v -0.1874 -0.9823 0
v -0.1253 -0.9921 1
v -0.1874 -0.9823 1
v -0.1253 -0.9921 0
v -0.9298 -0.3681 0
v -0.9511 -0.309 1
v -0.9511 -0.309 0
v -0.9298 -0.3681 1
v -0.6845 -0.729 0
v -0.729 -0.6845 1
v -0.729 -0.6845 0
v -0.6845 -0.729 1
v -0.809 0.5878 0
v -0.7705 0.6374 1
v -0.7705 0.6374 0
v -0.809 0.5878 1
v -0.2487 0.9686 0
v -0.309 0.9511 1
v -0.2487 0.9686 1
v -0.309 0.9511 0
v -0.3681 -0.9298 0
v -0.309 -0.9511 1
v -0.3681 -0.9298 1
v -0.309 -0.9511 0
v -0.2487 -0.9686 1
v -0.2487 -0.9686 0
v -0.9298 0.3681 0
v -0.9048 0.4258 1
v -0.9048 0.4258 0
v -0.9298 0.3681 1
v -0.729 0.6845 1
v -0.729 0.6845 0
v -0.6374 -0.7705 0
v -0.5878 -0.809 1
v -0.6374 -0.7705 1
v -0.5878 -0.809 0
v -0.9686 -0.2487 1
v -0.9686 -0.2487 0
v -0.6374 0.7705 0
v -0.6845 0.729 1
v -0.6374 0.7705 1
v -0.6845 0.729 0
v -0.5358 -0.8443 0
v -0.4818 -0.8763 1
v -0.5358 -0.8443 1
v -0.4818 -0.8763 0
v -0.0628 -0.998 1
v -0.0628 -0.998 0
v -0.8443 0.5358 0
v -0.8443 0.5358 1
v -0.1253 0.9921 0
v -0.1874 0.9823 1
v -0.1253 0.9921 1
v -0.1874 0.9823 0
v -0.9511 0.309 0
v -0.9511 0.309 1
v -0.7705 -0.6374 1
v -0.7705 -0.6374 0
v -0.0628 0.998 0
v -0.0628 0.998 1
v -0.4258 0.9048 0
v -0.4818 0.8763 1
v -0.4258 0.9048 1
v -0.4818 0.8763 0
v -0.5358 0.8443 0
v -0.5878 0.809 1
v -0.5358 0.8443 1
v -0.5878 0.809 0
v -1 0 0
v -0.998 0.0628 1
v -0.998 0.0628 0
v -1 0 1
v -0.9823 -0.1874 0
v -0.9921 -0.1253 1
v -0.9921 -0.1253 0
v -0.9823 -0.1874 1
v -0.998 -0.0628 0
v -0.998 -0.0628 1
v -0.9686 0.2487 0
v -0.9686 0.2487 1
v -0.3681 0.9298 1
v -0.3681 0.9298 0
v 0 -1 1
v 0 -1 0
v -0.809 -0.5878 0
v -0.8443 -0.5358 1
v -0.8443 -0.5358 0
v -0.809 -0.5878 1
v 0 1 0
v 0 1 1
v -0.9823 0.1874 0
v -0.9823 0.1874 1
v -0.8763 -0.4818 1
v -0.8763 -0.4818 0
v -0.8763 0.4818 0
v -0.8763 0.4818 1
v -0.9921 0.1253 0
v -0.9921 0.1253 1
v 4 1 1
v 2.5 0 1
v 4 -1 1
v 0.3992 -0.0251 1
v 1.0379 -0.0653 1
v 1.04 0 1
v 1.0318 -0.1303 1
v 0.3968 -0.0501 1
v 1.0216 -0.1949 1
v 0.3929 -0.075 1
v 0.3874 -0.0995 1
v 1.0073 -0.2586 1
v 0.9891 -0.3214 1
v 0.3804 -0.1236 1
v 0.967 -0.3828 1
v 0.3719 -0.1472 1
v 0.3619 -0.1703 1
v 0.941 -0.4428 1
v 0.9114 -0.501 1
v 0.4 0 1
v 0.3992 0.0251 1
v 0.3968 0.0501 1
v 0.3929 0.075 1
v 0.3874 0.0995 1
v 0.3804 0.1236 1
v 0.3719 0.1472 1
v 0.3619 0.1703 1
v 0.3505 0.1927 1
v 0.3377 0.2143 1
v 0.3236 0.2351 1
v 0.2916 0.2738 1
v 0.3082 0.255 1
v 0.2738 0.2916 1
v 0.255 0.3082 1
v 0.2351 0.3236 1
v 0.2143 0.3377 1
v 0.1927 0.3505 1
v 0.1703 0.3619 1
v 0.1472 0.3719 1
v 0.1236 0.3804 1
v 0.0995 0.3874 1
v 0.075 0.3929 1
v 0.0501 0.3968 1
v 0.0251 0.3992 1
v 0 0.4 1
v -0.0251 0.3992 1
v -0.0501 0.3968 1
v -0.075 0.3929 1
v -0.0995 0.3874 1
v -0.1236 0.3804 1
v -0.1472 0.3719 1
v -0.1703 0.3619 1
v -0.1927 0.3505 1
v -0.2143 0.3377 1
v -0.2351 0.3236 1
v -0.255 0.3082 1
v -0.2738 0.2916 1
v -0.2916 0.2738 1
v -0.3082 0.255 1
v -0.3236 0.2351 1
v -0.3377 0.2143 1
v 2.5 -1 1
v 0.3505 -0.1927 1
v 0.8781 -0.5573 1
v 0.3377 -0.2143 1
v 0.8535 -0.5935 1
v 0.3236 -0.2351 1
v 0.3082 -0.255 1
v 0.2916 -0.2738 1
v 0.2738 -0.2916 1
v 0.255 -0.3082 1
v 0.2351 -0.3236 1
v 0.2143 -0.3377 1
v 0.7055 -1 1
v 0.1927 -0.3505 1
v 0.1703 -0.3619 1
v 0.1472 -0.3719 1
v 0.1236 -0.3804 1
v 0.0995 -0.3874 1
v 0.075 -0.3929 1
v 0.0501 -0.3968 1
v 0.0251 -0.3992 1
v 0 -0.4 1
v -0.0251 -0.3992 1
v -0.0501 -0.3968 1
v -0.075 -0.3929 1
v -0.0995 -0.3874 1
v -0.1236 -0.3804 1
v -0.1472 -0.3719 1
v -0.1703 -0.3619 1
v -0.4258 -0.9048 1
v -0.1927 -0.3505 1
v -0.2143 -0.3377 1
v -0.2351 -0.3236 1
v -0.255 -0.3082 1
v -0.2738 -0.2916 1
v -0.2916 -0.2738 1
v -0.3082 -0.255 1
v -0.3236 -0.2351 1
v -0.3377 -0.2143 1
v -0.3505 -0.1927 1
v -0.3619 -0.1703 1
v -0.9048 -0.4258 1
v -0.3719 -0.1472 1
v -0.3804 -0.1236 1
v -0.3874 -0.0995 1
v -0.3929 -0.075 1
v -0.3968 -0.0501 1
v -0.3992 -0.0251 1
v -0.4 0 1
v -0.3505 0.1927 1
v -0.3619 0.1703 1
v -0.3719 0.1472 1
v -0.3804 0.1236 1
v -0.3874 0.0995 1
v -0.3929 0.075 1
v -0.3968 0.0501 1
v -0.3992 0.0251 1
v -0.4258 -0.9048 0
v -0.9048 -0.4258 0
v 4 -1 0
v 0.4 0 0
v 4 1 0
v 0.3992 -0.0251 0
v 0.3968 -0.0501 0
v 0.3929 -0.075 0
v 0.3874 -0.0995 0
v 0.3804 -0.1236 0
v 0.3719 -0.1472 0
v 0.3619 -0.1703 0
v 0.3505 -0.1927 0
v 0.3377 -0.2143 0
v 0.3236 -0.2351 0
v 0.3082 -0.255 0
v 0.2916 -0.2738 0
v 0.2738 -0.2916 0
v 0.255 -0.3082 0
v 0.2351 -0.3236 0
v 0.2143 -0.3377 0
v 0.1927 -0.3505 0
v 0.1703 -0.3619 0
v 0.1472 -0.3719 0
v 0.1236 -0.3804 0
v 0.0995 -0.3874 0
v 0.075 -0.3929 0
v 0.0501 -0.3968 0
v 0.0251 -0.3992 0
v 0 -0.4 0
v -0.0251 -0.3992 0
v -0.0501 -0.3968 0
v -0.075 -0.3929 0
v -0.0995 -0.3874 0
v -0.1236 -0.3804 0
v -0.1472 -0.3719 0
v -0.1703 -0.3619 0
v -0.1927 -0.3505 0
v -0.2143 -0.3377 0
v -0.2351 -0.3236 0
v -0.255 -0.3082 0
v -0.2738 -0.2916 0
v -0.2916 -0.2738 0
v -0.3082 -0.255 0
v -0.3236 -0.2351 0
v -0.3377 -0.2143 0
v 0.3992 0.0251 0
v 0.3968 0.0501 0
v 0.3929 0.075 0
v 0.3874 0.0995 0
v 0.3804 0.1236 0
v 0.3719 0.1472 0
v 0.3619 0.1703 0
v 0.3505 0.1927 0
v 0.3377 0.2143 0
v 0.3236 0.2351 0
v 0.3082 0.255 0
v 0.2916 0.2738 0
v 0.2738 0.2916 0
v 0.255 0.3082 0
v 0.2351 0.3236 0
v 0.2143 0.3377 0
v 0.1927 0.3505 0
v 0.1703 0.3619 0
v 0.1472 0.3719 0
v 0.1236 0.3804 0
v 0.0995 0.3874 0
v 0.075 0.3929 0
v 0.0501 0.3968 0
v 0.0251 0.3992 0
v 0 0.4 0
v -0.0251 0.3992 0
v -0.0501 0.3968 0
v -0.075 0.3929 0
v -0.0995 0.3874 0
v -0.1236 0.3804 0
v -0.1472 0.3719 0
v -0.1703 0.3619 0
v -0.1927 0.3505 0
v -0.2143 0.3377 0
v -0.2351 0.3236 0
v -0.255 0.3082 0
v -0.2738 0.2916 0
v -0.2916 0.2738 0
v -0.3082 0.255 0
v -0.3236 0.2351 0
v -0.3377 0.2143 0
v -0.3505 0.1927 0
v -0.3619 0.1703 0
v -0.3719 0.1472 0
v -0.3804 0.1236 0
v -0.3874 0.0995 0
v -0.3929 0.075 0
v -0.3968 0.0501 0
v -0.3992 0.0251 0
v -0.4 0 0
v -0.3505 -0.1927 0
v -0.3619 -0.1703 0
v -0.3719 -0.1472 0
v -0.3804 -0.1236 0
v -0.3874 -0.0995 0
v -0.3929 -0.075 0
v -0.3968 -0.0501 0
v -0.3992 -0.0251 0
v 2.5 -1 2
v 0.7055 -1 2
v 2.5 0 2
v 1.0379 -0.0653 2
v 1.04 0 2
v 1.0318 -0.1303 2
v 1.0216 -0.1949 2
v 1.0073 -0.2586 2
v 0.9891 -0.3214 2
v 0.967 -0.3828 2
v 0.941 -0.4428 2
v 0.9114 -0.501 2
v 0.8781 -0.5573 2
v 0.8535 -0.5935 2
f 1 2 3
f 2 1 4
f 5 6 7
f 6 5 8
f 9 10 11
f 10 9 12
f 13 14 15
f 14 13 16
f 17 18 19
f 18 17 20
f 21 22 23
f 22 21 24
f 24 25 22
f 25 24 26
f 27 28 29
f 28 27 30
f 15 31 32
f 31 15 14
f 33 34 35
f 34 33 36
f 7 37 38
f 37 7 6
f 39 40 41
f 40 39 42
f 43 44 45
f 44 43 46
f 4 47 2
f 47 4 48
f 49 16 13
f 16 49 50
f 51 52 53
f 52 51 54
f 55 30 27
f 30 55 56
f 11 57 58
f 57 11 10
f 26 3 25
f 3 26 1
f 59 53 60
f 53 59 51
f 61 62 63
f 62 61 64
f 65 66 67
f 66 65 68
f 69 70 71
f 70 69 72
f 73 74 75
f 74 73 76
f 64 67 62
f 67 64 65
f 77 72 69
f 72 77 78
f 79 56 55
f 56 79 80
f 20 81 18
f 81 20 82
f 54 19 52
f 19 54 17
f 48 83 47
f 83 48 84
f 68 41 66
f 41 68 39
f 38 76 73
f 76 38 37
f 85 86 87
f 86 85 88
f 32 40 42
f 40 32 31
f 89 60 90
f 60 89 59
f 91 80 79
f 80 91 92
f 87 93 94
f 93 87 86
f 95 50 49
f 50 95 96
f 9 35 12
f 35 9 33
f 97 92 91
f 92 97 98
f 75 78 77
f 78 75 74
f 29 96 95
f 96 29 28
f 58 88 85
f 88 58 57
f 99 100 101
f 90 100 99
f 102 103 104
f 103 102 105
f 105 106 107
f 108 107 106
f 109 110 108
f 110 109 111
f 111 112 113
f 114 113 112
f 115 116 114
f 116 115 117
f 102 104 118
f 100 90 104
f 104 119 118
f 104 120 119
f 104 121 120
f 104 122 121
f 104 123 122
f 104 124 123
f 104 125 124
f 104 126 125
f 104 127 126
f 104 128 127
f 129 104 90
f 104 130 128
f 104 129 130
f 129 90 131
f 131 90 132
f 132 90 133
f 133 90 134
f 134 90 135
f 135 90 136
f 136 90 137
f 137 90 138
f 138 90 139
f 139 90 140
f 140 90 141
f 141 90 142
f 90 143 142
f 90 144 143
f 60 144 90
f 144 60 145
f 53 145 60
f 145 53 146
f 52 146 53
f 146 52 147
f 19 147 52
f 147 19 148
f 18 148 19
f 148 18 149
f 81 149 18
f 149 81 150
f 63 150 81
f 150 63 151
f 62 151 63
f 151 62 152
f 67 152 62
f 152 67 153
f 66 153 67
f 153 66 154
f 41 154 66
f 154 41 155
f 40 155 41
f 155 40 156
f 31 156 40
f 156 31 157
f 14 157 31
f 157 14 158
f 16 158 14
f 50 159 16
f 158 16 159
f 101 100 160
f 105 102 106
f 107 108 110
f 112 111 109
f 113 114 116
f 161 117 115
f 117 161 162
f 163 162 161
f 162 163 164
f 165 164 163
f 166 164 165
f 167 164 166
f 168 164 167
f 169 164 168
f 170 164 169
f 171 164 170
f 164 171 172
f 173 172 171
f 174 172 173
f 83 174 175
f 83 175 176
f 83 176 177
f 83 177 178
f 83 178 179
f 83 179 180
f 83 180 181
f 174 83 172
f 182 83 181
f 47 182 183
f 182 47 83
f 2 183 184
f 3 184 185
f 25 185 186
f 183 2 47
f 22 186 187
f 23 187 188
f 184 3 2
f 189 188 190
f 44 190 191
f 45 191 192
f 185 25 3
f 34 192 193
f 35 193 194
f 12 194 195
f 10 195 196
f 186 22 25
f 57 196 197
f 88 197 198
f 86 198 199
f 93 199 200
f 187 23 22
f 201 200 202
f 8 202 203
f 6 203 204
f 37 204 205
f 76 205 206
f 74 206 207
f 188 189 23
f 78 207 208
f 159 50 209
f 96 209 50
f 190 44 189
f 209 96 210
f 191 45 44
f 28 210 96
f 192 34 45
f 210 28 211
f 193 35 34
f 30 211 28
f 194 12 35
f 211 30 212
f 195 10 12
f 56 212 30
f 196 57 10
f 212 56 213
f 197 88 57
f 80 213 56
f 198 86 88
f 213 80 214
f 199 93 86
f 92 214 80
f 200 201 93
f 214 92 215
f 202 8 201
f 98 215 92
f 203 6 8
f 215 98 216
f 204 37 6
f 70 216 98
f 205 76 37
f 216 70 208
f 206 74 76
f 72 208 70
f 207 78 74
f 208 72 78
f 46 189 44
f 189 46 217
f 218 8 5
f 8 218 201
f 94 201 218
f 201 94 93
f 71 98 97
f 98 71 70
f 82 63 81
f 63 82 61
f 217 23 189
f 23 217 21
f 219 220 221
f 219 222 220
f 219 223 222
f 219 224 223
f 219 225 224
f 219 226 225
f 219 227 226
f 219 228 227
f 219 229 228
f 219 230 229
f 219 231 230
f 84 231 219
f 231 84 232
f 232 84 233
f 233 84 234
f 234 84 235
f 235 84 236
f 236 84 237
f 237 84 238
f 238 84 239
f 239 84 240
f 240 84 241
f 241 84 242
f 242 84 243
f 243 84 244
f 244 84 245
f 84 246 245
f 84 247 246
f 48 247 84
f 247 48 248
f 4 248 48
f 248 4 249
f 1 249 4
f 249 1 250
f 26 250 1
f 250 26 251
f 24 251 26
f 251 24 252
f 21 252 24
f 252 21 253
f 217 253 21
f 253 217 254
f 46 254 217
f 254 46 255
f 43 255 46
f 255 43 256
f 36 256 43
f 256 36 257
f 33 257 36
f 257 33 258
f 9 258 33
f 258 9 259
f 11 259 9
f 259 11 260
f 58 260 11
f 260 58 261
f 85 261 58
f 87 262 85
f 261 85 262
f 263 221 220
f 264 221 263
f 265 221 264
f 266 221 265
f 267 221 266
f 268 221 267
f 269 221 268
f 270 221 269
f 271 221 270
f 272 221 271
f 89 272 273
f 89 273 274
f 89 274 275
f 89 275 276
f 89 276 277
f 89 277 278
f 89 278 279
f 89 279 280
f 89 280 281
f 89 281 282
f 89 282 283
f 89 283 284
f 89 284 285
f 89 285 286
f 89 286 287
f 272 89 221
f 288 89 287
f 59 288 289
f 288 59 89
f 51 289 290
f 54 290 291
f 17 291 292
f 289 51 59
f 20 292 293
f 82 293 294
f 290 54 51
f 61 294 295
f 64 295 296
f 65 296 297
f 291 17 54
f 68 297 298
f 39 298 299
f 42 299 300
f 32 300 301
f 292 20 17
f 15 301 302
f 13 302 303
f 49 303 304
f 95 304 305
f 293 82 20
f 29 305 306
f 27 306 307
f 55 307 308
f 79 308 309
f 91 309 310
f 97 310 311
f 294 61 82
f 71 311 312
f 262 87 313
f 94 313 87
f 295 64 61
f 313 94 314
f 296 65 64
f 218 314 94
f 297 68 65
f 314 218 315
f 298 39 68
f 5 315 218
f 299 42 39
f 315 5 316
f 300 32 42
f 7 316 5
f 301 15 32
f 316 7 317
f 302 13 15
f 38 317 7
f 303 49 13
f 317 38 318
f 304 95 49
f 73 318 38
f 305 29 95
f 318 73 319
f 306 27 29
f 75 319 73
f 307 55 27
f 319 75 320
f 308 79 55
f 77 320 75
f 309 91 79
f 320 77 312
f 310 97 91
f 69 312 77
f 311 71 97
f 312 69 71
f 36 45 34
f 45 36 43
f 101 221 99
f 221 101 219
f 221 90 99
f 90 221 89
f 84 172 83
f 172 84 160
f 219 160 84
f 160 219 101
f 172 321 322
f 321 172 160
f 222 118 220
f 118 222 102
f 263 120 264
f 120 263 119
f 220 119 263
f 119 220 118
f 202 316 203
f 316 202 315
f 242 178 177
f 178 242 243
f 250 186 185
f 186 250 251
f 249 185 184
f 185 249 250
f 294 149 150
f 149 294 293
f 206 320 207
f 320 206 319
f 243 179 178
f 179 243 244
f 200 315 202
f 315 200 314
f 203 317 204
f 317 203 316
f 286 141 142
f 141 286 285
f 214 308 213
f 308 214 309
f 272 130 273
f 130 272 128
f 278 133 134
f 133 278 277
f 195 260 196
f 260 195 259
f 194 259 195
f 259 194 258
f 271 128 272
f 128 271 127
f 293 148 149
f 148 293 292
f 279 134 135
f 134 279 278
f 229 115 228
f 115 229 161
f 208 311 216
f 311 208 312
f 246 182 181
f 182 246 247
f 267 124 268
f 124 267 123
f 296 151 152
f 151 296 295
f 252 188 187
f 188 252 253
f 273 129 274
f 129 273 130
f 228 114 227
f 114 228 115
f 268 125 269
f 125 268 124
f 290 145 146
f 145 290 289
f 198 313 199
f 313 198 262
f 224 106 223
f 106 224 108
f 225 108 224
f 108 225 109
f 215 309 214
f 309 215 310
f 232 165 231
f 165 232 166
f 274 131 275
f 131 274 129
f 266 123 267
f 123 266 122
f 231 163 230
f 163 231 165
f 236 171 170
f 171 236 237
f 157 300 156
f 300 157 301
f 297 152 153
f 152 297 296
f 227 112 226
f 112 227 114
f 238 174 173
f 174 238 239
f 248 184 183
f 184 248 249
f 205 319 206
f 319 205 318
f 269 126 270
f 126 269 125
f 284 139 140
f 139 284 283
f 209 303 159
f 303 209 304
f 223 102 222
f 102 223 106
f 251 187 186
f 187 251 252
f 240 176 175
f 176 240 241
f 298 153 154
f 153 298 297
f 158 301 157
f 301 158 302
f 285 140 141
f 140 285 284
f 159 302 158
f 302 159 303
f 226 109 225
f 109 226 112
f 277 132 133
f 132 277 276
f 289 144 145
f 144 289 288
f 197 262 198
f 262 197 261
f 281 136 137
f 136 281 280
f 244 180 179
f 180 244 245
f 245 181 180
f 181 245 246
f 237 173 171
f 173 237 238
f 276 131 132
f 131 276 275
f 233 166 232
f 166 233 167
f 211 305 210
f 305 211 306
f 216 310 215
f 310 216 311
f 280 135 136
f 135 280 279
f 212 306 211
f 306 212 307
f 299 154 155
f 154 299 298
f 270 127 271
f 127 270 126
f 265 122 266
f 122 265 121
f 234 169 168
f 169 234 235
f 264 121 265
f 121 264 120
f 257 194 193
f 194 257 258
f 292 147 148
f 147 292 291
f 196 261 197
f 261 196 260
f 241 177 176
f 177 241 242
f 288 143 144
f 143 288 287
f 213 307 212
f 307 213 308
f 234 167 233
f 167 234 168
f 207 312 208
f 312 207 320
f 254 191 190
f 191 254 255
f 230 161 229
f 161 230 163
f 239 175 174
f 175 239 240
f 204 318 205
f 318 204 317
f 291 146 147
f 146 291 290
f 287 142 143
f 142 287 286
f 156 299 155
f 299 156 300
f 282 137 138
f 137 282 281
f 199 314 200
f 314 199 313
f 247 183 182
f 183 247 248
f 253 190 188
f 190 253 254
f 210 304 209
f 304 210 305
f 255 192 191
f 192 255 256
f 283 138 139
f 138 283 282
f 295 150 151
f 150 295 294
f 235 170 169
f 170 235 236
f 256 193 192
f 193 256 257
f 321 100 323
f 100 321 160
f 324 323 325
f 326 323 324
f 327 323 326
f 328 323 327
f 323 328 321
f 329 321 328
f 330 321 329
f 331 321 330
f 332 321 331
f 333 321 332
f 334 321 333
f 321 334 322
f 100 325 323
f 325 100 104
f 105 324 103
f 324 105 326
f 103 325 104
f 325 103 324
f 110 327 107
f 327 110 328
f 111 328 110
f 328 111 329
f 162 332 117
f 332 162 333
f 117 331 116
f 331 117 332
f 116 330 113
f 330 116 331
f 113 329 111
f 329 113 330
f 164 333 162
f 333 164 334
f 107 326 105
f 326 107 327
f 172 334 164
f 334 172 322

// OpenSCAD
margin = 0.02;
circle_steps = 100;


module single_ring() {
    //
    // create a ring on the end of a bar, one end of a link
    //
    difference(){
        union() {
            cylinder(r=1, $fn=circle_steps, center=false);
            translate([0,-1,0]) {
                cube([4,2,1], center=false);
            }
        }
        translate([0,0,-1]){
            cylinder(h=3,r=.4, $fn=circle_steps, center=false);
        }
    }
}

//single_ring();
//translate([0, 0, 1]) {
//    rotate([0, 0, 120]) {
//        color("blue") {
//            single_ring();
//        }
//    }
//}

module stopper_block(angle, upper=false) {
    rotate([upper ? 180 : 0, 0, 0]) {
        difference() {
            translate([1, .5, 0]) {
                color("red") cube([3, 1, 1], center=true);
            }
            cylinder(h=3,r=1+2*margin, $fn=circle_steps, center=true);
            rotate([0, 0, angle]) {
                translate([0, 1, margin]) {
                    color("green")
                    cube([2.01, 2, 1.2], center=true);
                }
            }
        }
    }
}

// stopper_block(30);


module link(top_left_angle, bottom_left_angle, top_right_angle, bottom_right_angle) {
    translate([0, 0, 0]) rotate([0, 0, 0]) {
        single_ring();
        translate([0, 0, 1.5]) {
            stopper_block(top_left_angle, upper=true);
        }
//        translate([0, 0, 1.5]) {
//            stopper_block(bottom_left_angle, upper=false);
//        }
    }
 
//    translate([5, 0, 0]) rotate([0, 0, 180]) {
//        single_ring();
//        translate([0, 0, 1.5]) {
//            stopper_block(top_right_angle, upper=true);
//        }
//        translate([0, 0, 1.5]) {
//            stopper_block(bottom_right_angle, upper=false);
//        }
//    }
}

// single_ring();

color("Aqua") {
    link(20, 45, 70, 55);
}


//translate([10,0,0 ]){
//    rotate([180,0,0]) {
//        mirror([0,0,1]) {
//            color("Orchid") {
//                link(44, 20, 0, 0);
//            }
//        }
//    }
//}
